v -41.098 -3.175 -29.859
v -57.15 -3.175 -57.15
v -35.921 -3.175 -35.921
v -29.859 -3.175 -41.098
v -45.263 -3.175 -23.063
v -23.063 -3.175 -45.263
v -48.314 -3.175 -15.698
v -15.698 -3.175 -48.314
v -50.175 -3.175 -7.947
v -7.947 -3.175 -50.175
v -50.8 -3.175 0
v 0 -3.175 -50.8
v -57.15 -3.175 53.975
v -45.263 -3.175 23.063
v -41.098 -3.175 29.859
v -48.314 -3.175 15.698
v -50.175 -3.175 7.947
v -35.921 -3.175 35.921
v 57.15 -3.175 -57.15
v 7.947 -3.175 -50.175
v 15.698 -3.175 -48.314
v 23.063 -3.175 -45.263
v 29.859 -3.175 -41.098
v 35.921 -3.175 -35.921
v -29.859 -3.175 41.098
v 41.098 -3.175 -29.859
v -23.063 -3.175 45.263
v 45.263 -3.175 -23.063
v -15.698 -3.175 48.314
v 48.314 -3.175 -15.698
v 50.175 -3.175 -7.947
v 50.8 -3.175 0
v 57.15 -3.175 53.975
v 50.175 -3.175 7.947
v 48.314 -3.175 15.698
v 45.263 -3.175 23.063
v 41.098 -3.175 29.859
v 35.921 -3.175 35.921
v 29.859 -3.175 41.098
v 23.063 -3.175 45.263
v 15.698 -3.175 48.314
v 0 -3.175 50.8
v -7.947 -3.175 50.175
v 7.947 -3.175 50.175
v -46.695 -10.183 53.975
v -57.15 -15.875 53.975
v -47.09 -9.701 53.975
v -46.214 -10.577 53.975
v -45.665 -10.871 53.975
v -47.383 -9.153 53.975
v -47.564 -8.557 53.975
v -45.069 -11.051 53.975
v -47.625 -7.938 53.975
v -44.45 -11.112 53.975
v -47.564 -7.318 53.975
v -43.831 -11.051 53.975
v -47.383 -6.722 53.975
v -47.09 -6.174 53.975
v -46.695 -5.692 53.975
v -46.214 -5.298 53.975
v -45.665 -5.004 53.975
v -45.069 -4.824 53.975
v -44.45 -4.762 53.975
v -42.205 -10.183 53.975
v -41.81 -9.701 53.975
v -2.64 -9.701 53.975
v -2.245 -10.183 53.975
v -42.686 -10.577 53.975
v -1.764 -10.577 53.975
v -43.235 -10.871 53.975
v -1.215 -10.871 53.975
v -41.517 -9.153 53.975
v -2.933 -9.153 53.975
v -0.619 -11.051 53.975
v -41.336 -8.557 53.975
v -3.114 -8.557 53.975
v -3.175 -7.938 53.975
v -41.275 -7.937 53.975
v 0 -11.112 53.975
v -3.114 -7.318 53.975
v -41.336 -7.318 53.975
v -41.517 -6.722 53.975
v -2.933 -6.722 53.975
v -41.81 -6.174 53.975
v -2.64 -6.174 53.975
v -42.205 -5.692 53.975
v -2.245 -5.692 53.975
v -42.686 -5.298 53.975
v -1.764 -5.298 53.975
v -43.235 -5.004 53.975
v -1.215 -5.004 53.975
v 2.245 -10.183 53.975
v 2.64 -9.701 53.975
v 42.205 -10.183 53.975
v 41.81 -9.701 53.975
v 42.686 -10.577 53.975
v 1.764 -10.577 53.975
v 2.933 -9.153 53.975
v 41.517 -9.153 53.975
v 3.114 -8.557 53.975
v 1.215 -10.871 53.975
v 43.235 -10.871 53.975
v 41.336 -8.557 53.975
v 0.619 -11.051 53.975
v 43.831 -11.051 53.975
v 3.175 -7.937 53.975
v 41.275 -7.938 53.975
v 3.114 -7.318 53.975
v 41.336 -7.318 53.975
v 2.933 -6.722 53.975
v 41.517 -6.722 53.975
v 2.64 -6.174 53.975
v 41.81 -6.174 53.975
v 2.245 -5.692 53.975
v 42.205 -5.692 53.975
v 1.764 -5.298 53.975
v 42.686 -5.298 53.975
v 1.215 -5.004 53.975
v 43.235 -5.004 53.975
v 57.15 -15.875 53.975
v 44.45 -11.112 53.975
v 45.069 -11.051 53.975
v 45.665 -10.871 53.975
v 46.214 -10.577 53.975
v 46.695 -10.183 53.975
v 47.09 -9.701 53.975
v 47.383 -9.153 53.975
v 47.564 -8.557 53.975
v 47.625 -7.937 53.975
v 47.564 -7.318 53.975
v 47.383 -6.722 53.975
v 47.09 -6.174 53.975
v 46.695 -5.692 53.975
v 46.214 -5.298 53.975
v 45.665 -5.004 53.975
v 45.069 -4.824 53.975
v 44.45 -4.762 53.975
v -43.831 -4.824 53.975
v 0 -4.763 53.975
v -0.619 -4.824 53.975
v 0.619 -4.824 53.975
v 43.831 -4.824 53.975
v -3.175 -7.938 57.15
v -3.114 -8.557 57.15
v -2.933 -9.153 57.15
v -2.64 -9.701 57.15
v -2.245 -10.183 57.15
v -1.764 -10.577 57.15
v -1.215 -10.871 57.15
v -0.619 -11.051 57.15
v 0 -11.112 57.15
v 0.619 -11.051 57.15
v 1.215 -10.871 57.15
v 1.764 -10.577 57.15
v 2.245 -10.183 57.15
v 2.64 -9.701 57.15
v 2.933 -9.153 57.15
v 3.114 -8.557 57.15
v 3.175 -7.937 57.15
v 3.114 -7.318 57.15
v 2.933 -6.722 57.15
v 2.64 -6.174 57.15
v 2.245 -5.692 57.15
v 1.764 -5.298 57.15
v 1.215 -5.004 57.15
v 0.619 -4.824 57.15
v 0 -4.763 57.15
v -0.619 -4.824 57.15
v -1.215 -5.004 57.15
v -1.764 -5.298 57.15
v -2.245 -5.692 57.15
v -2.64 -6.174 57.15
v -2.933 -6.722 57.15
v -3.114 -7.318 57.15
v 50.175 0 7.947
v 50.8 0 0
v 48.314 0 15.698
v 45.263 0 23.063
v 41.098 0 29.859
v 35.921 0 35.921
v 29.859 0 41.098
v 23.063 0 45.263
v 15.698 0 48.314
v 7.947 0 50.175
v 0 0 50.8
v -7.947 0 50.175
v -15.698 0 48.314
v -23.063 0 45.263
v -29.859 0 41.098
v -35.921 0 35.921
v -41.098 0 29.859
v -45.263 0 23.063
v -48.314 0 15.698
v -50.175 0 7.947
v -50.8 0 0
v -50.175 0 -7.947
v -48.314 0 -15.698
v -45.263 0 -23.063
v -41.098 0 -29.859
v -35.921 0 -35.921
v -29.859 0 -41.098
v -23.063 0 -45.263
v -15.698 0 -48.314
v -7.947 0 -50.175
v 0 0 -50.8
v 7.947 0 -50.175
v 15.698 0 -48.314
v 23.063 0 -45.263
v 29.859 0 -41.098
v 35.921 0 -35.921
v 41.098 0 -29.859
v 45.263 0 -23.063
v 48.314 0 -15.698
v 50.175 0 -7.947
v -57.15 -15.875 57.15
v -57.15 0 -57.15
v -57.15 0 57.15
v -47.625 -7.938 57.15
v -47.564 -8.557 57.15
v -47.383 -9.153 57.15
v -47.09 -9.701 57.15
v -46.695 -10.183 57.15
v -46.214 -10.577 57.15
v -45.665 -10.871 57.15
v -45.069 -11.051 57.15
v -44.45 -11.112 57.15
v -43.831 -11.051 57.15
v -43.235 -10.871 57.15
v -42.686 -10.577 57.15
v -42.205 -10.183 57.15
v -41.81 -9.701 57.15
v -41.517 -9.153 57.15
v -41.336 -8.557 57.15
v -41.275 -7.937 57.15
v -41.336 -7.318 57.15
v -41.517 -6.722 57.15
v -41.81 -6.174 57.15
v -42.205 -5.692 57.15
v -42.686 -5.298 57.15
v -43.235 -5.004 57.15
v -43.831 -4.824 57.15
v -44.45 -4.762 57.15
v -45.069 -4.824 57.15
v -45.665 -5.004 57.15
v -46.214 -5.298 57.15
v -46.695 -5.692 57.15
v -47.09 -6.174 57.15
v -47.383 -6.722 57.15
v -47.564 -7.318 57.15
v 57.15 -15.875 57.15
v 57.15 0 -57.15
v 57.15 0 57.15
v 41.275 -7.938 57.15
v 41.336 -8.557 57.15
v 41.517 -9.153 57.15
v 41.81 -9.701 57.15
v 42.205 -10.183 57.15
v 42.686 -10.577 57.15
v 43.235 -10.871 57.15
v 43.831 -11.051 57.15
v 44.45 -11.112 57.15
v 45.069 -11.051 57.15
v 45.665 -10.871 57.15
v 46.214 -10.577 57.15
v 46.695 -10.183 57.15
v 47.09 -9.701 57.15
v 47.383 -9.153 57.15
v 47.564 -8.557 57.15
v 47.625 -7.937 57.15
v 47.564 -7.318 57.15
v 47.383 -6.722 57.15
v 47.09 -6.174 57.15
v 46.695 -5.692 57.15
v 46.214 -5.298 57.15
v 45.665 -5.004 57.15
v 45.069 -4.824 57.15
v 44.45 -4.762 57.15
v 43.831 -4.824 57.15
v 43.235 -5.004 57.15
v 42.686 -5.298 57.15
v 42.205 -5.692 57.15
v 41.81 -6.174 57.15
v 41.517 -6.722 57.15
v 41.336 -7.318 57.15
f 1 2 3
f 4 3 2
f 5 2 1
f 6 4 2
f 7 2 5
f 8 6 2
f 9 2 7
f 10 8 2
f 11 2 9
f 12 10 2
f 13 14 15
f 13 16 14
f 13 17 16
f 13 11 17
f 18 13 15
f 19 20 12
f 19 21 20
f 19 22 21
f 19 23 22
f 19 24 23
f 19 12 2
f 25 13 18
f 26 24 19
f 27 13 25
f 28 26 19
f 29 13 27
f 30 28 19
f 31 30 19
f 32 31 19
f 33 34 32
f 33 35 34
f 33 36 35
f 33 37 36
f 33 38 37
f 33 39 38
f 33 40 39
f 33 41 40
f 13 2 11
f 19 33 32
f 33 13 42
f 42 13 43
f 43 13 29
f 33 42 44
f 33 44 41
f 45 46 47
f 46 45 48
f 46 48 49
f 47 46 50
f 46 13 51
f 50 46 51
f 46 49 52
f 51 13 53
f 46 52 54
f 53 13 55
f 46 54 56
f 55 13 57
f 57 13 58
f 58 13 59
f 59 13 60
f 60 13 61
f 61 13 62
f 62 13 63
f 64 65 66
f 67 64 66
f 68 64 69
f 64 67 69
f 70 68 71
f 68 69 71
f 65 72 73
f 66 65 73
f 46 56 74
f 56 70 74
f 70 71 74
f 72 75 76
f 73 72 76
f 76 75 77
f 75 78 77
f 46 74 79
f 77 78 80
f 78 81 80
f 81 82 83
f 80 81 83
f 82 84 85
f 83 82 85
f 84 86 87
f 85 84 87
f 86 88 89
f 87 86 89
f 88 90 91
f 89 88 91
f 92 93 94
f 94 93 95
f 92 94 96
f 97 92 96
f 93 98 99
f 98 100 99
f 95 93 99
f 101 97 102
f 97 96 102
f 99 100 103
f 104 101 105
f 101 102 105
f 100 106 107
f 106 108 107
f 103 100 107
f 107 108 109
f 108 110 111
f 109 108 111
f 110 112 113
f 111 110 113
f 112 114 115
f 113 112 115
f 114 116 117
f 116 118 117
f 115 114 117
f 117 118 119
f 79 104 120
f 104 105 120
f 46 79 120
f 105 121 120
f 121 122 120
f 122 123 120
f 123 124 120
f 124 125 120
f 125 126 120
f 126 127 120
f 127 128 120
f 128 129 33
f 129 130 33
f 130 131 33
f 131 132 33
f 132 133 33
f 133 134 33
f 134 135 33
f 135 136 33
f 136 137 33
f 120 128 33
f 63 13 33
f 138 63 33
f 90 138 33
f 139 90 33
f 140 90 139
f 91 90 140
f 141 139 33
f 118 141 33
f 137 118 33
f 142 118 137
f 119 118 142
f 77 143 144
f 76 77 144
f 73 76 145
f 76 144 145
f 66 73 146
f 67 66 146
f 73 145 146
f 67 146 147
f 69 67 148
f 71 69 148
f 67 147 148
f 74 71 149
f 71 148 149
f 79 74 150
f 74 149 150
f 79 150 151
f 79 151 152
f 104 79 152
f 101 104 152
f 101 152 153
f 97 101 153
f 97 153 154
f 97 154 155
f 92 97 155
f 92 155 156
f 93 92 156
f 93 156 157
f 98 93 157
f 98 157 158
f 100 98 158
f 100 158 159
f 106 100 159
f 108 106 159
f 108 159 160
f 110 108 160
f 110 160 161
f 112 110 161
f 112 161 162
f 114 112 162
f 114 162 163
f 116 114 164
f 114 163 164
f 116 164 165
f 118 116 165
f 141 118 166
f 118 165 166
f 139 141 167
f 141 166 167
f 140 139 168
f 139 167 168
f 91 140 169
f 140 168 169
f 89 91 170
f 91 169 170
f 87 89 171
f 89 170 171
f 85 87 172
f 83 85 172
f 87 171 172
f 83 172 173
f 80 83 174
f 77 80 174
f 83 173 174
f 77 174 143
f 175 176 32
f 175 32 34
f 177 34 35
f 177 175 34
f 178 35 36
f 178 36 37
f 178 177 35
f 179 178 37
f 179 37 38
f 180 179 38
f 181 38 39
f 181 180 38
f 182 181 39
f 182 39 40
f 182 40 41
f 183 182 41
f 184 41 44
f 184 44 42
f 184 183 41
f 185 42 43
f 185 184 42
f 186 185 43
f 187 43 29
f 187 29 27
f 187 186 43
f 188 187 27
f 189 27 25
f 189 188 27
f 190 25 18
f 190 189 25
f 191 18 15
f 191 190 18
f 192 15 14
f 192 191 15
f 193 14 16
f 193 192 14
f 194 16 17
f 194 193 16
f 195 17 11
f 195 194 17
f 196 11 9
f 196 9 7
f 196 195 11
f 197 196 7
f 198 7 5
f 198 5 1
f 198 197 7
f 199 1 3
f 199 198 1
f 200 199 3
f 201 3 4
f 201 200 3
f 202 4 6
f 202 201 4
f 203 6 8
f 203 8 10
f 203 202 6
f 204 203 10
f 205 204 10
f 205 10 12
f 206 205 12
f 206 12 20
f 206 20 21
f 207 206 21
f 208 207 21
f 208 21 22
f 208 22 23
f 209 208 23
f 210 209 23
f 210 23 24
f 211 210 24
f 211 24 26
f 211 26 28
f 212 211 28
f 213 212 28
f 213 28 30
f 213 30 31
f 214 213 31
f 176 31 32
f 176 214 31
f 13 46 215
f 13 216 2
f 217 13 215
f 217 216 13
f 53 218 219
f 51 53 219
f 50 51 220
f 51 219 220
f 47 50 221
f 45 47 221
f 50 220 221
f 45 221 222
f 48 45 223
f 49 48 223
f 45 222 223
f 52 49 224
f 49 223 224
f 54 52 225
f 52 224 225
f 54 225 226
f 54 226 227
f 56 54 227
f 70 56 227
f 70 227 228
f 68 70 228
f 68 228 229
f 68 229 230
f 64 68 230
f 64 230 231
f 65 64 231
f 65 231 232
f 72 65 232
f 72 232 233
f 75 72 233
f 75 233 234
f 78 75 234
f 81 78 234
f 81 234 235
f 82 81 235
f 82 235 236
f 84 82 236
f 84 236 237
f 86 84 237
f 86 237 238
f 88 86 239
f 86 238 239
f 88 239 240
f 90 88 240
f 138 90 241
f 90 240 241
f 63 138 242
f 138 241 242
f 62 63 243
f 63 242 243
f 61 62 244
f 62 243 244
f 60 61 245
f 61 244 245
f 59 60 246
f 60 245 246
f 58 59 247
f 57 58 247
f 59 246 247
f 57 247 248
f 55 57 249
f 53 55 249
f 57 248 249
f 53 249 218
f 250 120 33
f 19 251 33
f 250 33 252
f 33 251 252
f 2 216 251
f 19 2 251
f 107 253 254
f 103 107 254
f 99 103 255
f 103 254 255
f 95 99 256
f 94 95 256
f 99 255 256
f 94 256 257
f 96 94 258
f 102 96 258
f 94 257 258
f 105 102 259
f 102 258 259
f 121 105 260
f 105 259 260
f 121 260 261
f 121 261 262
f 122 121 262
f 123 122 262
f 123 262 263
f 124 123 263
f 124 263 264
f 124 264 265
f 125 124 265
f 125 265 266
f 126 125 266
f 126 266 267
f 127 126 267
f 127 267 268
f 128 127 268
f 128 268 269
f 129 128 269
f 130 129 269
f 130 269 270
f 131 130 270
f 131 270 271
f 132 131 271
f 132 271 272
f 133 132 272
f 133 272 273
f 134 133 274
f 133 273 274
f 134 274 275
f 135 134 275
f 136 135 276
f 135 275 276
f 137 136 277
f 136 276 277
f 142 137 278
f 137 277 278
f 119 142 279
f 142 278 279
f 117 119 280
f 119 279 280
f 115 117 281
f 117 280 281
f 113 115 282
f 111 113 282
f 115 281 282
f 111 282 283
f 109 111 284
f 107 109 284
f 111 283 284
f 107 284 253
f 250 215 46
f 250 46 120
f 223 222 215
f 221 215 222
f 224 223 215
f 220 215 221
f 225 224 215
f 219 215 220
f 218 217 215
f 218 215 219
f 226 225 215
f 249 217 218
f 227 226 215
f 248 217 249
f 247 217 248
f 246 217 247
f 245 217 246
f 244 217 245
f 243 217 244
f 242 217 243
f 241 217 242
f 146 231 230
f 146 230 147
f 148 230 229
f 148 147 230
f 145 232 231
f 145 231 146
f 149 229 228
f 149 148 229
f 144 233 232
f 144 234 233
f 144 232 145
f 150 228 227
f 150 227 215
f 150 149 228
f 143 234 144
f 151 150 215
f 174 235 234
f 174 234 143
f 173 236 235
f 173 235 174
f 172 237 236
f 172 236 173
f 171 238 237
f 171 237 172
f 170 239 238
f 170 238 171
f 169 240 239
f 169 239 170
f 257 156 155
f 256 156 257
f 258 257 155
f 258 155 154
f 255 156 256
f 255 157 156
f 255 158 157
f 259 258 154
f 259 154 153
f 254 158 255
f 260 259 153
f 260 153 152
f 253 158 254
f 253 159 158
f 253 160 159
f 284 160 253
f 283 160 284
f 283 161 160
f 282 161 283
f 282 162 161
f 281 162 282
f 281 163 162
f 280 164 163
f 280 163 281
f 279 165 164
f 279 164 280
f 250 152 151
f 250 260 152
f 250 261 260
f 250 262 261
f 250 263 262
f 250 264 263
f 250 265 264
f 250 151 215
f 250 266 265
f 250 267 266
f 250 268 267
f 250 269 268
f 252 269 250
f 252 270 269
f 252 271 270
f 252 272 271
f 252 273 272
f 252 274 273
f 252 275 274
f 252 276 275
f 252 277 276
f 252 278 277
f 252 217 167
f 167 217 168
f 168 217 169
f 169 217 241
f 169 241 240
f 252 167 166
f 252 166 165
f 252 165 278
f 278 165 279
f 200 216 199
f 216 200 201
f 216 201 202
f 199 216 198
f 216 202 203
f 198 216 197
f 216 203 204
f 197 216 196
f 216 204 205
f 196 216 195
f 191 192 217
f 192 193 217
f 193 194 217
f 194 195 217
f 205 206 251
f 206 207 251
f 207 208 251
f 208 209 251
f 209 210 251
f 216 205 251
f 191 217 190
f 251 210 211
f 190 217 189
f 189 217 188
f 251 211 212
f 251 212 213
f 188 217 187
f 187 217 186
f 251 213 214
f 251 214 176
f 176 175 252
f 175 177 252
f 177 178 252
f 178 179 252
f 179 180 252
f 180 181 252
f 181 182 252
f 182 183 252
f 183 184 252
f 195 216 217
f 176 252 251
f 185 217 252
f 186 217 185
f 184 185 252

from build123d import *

# Parameters (mm, degrees)
F0_W     = 114.3
F0_H     = 114.3
F0_R     = 50.8
F1_DEPTH = 3.175
F2_W     = 114.3
F2_H     = 3.175
F3_DEPTH = 12.7
F5_DEPTH = 25.4


with BuildPart() as f1:
    # F0 (on Front) → F1 (new body)
    with BuildSketch(Plane.XZ):
        Rectangle(F0_W, F0_H)
        Circle(F0_R, mode=Mode.SUBTRACT)
    extrude(amount=F1_DEPTH)

    # F2 (on face) → F3 (join)
    with BuildSketch(Plane.XZ.offset(3.175)):
        with Locations((0, 55.5625)):
            Rectangle(F2_W, F2_H)
    extrude(amount=F3_DEPTH)

    # F4 (on face) → F5 (cut)
    with BuildSketch(Plane.XY.offset(57.15)):
        with BuildLine():
            ThreePointArc((-41.275, -7.9375), (-44.45, -4.7625), (-47.625, -7.9375))
            Line((-47.625, -7.9375), (-41.275, -7.9375))
        make_face()
        with BuildLine():
            ThreePointArc((47.625, -7.9375), (44.45, -4.7625), (41.275, -7.9375))
            Line((41.275, -7.9375), (47.625, -7.9375))
        make_face()
        with BuildLine():
            Line((47.625, -7.9375), (41.275, -7.9375))
            ThreePointArc((41.275, -7.9375), (44.45, -11.1125), (47.625, -7.9375))
        make_face()
        with BuildLine():
            ThreePointArc((3.175, -7.9375), (0, -4.7625), (-3.175, -7.9375))
            Line((-3.175, -7.9375), (3.175, -7.9375))
        make_face()
        with BuildLine():
            Line((3.175, -7.9375), (-3.175, -7.9375))
            ThreePointArc((-3.175, -7.9375), (0, -11.1125), (3.175, -7.9375))
        make_face()
        with BuildLine():
            Line((-41.275, -7.9375), (-47.625, -7.9375))
            ThreePointArc((-47.625, -7.9375), (-44.45, -11.1125), (-41.275, -7.9375))
        make_face()
    extrude(amount=-F5_DEPTH, mode=Mode.SUBTRACT)


solid = f1.part
